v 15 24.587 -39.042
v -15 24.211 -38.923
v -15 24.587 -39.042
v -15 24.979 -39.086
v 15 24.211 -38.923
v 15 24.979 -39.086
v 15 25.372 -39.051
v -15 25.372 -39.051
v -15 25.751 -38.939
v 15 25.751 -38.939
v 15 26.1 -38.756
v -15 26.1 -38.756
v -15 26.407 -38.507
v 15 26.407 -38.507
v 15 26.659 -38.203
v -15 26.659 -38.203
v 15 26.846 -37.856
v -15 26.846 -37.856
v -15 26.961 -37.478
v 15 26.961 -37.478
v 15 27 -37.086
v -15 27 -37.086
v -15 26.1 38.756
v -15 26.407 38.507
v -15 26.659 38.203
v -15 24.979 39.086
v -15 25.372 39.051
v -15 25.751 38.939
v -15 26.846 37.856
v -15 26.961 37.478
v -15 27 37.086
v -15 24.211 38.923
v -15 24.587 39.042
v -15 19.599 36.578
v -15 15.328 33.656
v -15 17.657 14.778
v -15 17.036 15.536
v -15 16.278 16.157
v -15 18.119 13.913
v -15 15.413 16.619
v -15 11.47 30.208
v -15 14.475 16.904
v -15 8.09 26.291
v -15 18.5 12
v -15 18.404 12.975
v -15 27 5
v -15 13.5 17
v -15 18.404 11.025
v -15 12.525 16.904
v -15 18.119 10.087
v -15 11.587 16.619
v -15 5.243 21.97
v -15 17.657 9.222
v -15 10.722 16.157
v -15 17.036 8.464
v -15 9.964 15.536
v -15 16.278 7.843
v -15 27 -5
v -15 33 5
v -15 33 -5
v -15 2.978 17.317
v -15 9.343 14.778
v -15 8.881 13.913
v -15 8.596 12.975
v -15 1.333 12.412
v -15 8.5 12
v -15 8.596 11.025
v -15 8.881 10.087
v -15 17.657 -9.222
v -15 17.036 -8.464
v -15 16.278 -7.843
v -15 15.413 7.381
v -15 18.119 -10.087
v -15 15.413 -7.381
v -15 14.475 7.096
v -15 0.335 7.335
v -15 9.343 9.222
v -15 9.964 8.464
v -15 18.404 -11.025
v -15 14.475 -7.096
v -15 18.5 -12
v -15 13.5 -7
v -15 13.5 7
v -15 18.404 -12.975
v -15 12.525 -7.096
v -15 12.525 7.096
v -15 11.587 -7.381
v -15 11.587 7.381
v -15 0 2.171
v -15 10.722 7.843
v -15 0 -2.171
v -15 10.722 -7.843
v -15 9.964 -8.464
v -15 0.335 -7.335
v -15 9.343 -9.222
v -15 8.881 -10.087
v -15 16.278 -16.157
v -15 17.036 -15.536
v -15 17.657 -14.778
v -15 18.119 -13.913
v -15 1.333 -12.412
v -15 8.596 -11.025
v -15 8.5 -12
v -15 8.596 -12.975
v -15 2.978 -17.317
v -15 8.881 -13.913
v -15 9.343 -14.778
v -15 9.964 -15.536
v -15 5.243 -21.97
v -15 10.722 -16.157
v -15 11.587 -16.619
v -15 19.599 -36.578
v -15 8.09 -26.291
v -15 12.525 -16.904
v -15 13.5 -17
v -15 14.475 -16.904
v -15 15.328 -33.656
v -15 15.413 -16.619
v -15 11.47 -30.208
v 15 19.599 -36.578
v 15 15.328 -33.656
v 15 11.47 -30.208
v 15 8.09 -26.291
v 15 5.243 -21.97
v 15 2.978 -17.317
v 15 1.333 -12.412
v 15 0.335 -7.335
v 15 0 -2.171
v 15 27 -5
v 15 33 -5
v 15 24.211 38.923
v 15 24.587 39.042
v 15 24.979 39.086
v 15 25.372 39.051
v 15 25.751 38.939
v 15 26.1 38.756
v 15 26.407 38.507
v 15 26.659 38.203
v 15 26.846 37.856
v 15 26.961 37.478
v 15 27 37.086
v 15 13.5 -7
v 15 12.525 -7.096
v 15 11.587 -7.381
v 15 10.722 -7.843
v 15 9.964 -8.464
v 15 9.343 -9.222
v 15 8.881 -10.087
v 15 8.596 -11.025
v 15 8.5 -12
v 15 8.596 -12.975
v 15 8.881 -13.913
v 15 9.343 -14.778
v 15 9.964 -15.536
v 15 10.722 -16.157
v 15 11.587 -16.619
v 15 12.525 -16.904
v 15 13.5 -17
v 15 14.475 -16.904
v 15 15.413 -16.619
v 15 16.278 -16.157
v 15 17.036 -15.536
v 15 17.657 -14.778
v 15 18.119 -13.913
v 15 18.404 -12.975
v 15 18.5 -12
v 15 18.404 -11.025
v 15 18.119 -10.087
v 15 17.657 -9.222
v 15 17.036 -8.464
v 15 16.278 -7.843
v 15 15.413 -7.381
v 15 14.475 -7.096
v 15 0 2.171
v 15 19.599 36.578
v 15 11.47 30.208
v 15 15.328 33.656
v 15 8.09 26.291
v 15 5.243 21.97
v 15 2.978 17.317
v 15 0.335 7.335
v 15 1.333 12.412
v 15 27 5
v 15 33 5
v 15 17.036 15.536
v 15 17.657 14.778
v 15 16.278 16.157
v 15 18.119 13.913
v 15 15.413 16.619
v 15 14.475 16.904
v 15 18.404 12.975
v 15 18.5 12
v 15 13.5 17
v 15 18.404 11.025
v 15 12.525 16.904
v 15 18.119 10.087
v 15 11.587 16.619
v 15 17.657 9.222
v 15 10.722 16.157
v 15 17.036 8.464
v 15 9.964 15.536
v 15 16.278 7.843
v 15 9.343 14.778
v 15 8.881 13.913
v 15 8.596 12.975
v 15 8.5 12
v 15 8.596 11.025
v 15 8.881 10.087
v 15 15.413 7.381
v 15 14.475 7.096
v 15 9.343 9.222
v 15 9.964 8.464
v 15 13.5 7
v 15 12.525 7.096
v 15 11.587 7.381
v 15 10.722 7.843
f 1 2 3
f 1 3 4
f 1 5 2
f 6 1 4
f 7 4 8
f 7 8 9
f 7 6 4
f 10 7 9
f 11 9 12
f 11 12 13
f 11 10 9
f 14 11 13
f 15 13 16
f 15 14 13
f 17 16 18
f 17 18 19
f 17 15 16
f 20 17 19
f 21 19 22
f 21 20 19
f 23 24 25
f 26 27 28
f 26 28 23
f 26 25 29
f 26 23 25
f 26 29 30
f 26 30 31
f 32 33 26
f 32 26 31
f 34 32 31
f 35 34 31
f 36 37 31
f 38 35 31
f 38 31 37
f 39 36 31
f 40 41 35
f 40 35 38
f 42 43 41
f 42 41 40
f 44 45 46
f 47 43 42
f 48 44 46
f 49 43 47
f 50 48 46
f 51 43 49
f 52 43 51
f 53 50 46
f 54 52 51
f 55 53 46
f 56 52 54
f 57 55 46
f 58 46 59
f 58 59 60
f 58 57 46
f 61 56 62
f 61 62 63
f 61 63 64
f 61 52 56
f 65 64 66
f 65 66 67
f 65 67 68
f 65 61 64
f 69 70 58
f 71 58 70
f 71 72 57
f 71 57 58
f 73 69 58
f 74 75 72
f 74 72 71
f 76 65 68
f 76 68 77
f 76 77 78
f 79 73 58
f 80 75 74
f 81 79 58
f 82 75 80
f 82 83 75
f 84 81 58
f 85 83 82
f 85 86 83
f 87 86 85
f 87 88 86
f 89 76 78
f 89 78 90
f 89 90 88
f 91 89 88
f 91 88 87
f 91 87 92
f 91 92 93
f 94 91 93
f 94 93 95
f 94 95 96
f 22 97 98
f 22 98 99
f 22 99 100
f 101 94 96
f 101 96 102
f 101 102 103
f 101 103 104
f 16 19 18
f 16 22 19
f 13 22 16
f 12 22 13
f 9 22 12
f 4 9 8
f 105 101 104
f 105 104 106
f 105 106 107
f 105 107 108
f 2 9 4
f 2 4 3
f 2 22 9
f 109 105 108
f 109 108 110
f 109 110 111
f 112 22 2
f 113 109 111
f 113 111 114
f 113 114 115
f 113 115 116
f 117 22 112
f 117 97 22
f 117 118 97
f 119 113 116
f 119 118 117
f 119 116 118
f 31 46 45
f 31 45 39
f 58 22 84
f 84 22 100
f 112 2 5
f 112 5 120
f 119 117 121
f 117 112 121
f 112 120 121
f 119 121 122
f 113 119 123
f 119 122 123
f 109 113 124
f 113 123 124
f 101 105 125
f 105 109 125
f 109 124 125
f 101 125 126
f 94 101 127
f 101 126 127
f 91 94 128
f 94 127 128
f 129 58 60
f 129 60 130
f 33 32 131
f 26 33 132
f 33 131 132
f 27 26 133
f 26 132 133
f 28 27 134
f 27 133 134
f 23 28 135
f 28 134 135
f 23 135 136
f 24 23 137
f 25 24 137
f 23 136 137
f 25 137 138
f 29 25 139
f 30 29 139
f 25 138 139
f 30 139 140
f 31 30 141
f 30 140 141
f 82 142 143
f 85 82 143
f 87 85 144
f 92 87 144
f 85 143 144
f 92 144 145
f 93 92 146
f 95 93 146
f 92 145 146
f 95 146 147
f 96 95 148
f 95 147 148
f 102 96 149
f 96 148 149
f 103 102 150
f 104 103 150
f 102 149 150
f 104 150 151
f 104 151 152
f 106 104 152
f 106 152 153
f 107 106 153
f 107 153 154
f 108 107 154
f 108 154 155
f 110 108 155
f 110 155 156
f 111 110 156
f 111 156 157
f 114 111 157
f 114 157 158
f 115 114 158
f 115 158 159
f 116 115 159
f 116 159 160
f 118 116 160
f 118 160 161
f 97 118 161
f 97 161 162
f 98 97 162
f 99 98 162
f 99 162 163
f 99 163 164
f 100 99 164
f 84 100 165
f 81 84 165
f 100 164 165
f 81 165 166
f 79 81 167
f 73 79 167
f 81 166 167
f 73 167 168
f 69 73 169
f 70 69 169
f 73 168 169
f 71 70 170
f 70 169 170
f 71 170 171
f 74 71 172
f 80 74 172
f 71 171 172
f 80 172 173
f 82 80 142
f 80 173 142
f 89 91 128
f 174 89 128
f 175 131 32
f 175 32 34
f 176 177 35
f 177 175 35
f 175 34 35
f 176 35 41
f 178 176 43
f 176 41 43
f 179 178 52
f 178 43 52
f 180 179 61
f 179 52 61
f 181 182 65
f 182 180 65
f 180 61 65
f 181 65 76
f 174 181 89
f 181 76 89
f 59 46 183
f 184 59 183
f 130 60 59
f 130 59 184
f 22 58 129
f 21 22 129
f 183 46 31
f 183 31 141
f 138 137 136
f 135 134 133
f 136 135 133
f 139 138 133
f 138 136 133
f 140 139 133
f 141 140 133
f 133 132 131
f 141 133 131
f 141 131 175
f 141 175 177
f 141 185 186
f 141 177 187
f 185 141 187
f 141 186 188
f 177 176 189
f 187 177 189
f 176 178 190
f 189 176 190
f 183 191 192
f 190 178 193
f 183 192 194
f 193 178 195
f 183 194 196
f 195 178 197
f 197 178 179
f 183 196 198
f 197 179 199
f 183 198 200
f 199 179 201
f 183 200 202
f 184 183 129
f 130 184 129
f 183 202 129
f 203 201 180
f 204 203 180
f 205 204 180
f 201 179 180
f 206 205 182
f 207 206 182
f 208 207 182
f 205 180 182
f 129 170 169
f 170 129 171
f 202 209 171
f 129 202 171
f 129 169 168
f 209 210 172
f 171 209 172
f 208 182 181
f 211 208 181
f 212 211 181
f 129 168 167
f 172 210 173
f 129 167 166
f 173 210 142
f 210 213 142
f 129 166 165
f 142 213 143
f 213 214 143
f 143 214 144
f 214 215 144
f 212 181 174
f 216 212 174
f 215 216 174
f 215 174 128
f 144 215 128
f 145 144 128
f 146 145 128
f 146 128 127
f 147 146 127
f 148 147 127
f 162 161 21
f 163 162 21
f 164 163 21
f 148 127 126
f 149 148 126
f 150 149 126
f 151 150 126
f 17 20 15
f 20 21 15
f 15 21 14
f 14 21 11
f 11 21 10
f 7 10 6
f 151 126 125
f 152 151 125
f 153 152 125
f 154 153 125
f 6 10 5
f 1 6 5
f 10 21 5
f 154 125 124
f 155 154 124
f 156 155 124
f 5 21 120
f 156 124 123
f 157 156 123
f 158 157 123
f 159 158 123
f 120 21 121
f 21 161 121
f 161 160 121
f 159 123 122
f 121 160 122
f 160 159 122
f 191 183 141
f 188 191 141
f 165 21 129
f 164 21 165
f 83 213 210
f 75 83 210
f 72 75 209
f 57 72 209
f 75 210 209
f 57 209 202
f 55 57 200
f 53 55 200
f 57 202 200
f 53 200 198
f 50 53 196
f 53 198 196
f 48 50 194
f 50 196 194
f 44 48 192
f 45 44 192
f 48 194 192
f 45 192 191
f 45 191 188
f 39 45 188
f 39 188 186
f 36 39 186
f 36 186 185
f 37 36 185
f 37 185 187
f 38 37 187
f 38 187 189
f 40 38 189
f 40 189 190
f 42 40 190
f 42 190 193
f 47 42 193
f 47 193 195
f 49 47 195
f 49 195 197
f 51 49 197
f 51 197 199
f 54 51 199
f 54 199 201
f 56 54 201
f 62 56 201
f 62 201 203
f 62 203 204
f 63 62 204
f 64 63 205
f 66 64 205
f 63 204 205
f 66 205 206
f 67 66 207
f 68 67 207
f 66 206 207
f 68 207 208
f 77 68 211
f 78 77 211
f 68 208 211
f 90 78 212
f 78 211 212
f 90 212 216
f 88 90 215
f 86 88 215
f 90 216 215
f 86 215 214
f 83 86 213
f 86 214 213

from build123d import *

# Parameters (mm, degrees)
SKETCH1_W           = 30
SKETCH1_H           = 80
BOSS_EXTRUDE1_DEPTH = 27
SKETCH5_W           = 30
SKETCH5_H           = 10
BOSS_EXTRUDE2_DEPTH = 6
SKETCH2_R           = 5
CUT_EXTRUDE1_DEPTH  = 40
FILLET5_R           = 40
FILLET6_R           = 40
FILLET7_R           = 2
FILLET8_R           = 2


with BuildPart() as part:
    # Sketch1 → Boss-Extrude1 (new body)
    with BuildSketch(Plane(origin=(0, 0, 0), x_dir=(1, 0, 0), z_dir=(0, 1, 0))):
        Rectangle(SKETCH1_W, SKETCH1_H)
    extrude(amount=BOSS_EXTRUDE1_DEPTH)

    # Sketch5 → Boss-Extrude2 (add)
    with BuildSketch(Plane(origin=(0, 27, 0), x_dir=(1, 0, 0), z_dir=(0, 1, 0))):
        Rectangle(SKETCH5_W, SKETCH5_H)
    extrude(amount=BOSS_EXTRUDE2_DEPTH)

    # Sketch2 → Cut-Extrude1 (cut)
    with BuildSketch(Plane(origin=(15, 0, 0), x_dir=(0, 0, -1), z_dir=(1, 0, 0))):
        with Locations((-12, 13.5)):
            Circle(SKETCH2_R)
        with Locations(Location((12, 13.5, 0), (0, 0, 180))):
            Circle(SKETCH2_R)
    extrude(amount=-CUT_EXTRUDE1_DEPTH, mode=Mode.SUBTRACT)

    # Fillet5
    # the kernel refuses this fillet: 40 mm, written as the material it takes off along each edge
    with BuildSketch(Plane(origin=(109.571401597, 0, -40), x_dir=(0, 0, 1), z_dir=(-1, 0, 0))) as fillet5_piece_1:
        with BuildLine():
            CenterArc((37.828560639, 40), FILLET5_R, 198.965574989, 71.034425011)
            Line((0, 27), (-0.756571213, 26.74))
            ThreePointArc((-0.756571213, 26.74), (-0.8, 13.5), (-0.8, 0))
            Line((-0.8, 0), (0, -0.8))
            Line((0, -0.8), (37.828560639, -0.8))
            Line((37.828560639, -0.8), (37.828560639, 0))
        make_face()
    extrude(amount=219.142803194, mode=Mode.SUBTRACT)

    # Fillet6
    # the kernel refuses this fillet: 40 mm, written as the material it takes off along each edge
    with BuildSketch(Plane(origin=(-109.571401597, 0, 40), x_dir=(0, 1, 0), z_dir=(1, 0, 0))) as fillet6_piece_1:
        with BuildLine():
            CenterArc((40, -37.828560639), FILLET6_R, 108.965574989, 71.034425011)
            Line((0, -37.828560639), (-0.8, -37.828560639))
            Line((-0.8, -37.828560639), (-0.8, 0))
            Line((-0.8, 0), (0, 0.8))
            ThreePointArc((0, 0.8), (13.5, 0.8), (26.74, 0.756571213))
            Line((26.74, 0.756571213), (27, 0))
        make_face()
    extrude(amount=219.142803194, mode=Mode.SUBTRACT)

    # Fillet7
    fillet7_edges = [part.edges().sort_by_distance(p)[0] for p in [
        (0, 27, -40),
    ]]
    fillet(fillet7_edges, radius=FILLET7_R)

    # Fillet8
    fillet8_edges = [part.edges().sort_by_distance(p)[0] for p in [
        (0, 27, 40),
    ]]
    fillet(fillet8_edges, radius=FILLET8_R)


solid = part.part
